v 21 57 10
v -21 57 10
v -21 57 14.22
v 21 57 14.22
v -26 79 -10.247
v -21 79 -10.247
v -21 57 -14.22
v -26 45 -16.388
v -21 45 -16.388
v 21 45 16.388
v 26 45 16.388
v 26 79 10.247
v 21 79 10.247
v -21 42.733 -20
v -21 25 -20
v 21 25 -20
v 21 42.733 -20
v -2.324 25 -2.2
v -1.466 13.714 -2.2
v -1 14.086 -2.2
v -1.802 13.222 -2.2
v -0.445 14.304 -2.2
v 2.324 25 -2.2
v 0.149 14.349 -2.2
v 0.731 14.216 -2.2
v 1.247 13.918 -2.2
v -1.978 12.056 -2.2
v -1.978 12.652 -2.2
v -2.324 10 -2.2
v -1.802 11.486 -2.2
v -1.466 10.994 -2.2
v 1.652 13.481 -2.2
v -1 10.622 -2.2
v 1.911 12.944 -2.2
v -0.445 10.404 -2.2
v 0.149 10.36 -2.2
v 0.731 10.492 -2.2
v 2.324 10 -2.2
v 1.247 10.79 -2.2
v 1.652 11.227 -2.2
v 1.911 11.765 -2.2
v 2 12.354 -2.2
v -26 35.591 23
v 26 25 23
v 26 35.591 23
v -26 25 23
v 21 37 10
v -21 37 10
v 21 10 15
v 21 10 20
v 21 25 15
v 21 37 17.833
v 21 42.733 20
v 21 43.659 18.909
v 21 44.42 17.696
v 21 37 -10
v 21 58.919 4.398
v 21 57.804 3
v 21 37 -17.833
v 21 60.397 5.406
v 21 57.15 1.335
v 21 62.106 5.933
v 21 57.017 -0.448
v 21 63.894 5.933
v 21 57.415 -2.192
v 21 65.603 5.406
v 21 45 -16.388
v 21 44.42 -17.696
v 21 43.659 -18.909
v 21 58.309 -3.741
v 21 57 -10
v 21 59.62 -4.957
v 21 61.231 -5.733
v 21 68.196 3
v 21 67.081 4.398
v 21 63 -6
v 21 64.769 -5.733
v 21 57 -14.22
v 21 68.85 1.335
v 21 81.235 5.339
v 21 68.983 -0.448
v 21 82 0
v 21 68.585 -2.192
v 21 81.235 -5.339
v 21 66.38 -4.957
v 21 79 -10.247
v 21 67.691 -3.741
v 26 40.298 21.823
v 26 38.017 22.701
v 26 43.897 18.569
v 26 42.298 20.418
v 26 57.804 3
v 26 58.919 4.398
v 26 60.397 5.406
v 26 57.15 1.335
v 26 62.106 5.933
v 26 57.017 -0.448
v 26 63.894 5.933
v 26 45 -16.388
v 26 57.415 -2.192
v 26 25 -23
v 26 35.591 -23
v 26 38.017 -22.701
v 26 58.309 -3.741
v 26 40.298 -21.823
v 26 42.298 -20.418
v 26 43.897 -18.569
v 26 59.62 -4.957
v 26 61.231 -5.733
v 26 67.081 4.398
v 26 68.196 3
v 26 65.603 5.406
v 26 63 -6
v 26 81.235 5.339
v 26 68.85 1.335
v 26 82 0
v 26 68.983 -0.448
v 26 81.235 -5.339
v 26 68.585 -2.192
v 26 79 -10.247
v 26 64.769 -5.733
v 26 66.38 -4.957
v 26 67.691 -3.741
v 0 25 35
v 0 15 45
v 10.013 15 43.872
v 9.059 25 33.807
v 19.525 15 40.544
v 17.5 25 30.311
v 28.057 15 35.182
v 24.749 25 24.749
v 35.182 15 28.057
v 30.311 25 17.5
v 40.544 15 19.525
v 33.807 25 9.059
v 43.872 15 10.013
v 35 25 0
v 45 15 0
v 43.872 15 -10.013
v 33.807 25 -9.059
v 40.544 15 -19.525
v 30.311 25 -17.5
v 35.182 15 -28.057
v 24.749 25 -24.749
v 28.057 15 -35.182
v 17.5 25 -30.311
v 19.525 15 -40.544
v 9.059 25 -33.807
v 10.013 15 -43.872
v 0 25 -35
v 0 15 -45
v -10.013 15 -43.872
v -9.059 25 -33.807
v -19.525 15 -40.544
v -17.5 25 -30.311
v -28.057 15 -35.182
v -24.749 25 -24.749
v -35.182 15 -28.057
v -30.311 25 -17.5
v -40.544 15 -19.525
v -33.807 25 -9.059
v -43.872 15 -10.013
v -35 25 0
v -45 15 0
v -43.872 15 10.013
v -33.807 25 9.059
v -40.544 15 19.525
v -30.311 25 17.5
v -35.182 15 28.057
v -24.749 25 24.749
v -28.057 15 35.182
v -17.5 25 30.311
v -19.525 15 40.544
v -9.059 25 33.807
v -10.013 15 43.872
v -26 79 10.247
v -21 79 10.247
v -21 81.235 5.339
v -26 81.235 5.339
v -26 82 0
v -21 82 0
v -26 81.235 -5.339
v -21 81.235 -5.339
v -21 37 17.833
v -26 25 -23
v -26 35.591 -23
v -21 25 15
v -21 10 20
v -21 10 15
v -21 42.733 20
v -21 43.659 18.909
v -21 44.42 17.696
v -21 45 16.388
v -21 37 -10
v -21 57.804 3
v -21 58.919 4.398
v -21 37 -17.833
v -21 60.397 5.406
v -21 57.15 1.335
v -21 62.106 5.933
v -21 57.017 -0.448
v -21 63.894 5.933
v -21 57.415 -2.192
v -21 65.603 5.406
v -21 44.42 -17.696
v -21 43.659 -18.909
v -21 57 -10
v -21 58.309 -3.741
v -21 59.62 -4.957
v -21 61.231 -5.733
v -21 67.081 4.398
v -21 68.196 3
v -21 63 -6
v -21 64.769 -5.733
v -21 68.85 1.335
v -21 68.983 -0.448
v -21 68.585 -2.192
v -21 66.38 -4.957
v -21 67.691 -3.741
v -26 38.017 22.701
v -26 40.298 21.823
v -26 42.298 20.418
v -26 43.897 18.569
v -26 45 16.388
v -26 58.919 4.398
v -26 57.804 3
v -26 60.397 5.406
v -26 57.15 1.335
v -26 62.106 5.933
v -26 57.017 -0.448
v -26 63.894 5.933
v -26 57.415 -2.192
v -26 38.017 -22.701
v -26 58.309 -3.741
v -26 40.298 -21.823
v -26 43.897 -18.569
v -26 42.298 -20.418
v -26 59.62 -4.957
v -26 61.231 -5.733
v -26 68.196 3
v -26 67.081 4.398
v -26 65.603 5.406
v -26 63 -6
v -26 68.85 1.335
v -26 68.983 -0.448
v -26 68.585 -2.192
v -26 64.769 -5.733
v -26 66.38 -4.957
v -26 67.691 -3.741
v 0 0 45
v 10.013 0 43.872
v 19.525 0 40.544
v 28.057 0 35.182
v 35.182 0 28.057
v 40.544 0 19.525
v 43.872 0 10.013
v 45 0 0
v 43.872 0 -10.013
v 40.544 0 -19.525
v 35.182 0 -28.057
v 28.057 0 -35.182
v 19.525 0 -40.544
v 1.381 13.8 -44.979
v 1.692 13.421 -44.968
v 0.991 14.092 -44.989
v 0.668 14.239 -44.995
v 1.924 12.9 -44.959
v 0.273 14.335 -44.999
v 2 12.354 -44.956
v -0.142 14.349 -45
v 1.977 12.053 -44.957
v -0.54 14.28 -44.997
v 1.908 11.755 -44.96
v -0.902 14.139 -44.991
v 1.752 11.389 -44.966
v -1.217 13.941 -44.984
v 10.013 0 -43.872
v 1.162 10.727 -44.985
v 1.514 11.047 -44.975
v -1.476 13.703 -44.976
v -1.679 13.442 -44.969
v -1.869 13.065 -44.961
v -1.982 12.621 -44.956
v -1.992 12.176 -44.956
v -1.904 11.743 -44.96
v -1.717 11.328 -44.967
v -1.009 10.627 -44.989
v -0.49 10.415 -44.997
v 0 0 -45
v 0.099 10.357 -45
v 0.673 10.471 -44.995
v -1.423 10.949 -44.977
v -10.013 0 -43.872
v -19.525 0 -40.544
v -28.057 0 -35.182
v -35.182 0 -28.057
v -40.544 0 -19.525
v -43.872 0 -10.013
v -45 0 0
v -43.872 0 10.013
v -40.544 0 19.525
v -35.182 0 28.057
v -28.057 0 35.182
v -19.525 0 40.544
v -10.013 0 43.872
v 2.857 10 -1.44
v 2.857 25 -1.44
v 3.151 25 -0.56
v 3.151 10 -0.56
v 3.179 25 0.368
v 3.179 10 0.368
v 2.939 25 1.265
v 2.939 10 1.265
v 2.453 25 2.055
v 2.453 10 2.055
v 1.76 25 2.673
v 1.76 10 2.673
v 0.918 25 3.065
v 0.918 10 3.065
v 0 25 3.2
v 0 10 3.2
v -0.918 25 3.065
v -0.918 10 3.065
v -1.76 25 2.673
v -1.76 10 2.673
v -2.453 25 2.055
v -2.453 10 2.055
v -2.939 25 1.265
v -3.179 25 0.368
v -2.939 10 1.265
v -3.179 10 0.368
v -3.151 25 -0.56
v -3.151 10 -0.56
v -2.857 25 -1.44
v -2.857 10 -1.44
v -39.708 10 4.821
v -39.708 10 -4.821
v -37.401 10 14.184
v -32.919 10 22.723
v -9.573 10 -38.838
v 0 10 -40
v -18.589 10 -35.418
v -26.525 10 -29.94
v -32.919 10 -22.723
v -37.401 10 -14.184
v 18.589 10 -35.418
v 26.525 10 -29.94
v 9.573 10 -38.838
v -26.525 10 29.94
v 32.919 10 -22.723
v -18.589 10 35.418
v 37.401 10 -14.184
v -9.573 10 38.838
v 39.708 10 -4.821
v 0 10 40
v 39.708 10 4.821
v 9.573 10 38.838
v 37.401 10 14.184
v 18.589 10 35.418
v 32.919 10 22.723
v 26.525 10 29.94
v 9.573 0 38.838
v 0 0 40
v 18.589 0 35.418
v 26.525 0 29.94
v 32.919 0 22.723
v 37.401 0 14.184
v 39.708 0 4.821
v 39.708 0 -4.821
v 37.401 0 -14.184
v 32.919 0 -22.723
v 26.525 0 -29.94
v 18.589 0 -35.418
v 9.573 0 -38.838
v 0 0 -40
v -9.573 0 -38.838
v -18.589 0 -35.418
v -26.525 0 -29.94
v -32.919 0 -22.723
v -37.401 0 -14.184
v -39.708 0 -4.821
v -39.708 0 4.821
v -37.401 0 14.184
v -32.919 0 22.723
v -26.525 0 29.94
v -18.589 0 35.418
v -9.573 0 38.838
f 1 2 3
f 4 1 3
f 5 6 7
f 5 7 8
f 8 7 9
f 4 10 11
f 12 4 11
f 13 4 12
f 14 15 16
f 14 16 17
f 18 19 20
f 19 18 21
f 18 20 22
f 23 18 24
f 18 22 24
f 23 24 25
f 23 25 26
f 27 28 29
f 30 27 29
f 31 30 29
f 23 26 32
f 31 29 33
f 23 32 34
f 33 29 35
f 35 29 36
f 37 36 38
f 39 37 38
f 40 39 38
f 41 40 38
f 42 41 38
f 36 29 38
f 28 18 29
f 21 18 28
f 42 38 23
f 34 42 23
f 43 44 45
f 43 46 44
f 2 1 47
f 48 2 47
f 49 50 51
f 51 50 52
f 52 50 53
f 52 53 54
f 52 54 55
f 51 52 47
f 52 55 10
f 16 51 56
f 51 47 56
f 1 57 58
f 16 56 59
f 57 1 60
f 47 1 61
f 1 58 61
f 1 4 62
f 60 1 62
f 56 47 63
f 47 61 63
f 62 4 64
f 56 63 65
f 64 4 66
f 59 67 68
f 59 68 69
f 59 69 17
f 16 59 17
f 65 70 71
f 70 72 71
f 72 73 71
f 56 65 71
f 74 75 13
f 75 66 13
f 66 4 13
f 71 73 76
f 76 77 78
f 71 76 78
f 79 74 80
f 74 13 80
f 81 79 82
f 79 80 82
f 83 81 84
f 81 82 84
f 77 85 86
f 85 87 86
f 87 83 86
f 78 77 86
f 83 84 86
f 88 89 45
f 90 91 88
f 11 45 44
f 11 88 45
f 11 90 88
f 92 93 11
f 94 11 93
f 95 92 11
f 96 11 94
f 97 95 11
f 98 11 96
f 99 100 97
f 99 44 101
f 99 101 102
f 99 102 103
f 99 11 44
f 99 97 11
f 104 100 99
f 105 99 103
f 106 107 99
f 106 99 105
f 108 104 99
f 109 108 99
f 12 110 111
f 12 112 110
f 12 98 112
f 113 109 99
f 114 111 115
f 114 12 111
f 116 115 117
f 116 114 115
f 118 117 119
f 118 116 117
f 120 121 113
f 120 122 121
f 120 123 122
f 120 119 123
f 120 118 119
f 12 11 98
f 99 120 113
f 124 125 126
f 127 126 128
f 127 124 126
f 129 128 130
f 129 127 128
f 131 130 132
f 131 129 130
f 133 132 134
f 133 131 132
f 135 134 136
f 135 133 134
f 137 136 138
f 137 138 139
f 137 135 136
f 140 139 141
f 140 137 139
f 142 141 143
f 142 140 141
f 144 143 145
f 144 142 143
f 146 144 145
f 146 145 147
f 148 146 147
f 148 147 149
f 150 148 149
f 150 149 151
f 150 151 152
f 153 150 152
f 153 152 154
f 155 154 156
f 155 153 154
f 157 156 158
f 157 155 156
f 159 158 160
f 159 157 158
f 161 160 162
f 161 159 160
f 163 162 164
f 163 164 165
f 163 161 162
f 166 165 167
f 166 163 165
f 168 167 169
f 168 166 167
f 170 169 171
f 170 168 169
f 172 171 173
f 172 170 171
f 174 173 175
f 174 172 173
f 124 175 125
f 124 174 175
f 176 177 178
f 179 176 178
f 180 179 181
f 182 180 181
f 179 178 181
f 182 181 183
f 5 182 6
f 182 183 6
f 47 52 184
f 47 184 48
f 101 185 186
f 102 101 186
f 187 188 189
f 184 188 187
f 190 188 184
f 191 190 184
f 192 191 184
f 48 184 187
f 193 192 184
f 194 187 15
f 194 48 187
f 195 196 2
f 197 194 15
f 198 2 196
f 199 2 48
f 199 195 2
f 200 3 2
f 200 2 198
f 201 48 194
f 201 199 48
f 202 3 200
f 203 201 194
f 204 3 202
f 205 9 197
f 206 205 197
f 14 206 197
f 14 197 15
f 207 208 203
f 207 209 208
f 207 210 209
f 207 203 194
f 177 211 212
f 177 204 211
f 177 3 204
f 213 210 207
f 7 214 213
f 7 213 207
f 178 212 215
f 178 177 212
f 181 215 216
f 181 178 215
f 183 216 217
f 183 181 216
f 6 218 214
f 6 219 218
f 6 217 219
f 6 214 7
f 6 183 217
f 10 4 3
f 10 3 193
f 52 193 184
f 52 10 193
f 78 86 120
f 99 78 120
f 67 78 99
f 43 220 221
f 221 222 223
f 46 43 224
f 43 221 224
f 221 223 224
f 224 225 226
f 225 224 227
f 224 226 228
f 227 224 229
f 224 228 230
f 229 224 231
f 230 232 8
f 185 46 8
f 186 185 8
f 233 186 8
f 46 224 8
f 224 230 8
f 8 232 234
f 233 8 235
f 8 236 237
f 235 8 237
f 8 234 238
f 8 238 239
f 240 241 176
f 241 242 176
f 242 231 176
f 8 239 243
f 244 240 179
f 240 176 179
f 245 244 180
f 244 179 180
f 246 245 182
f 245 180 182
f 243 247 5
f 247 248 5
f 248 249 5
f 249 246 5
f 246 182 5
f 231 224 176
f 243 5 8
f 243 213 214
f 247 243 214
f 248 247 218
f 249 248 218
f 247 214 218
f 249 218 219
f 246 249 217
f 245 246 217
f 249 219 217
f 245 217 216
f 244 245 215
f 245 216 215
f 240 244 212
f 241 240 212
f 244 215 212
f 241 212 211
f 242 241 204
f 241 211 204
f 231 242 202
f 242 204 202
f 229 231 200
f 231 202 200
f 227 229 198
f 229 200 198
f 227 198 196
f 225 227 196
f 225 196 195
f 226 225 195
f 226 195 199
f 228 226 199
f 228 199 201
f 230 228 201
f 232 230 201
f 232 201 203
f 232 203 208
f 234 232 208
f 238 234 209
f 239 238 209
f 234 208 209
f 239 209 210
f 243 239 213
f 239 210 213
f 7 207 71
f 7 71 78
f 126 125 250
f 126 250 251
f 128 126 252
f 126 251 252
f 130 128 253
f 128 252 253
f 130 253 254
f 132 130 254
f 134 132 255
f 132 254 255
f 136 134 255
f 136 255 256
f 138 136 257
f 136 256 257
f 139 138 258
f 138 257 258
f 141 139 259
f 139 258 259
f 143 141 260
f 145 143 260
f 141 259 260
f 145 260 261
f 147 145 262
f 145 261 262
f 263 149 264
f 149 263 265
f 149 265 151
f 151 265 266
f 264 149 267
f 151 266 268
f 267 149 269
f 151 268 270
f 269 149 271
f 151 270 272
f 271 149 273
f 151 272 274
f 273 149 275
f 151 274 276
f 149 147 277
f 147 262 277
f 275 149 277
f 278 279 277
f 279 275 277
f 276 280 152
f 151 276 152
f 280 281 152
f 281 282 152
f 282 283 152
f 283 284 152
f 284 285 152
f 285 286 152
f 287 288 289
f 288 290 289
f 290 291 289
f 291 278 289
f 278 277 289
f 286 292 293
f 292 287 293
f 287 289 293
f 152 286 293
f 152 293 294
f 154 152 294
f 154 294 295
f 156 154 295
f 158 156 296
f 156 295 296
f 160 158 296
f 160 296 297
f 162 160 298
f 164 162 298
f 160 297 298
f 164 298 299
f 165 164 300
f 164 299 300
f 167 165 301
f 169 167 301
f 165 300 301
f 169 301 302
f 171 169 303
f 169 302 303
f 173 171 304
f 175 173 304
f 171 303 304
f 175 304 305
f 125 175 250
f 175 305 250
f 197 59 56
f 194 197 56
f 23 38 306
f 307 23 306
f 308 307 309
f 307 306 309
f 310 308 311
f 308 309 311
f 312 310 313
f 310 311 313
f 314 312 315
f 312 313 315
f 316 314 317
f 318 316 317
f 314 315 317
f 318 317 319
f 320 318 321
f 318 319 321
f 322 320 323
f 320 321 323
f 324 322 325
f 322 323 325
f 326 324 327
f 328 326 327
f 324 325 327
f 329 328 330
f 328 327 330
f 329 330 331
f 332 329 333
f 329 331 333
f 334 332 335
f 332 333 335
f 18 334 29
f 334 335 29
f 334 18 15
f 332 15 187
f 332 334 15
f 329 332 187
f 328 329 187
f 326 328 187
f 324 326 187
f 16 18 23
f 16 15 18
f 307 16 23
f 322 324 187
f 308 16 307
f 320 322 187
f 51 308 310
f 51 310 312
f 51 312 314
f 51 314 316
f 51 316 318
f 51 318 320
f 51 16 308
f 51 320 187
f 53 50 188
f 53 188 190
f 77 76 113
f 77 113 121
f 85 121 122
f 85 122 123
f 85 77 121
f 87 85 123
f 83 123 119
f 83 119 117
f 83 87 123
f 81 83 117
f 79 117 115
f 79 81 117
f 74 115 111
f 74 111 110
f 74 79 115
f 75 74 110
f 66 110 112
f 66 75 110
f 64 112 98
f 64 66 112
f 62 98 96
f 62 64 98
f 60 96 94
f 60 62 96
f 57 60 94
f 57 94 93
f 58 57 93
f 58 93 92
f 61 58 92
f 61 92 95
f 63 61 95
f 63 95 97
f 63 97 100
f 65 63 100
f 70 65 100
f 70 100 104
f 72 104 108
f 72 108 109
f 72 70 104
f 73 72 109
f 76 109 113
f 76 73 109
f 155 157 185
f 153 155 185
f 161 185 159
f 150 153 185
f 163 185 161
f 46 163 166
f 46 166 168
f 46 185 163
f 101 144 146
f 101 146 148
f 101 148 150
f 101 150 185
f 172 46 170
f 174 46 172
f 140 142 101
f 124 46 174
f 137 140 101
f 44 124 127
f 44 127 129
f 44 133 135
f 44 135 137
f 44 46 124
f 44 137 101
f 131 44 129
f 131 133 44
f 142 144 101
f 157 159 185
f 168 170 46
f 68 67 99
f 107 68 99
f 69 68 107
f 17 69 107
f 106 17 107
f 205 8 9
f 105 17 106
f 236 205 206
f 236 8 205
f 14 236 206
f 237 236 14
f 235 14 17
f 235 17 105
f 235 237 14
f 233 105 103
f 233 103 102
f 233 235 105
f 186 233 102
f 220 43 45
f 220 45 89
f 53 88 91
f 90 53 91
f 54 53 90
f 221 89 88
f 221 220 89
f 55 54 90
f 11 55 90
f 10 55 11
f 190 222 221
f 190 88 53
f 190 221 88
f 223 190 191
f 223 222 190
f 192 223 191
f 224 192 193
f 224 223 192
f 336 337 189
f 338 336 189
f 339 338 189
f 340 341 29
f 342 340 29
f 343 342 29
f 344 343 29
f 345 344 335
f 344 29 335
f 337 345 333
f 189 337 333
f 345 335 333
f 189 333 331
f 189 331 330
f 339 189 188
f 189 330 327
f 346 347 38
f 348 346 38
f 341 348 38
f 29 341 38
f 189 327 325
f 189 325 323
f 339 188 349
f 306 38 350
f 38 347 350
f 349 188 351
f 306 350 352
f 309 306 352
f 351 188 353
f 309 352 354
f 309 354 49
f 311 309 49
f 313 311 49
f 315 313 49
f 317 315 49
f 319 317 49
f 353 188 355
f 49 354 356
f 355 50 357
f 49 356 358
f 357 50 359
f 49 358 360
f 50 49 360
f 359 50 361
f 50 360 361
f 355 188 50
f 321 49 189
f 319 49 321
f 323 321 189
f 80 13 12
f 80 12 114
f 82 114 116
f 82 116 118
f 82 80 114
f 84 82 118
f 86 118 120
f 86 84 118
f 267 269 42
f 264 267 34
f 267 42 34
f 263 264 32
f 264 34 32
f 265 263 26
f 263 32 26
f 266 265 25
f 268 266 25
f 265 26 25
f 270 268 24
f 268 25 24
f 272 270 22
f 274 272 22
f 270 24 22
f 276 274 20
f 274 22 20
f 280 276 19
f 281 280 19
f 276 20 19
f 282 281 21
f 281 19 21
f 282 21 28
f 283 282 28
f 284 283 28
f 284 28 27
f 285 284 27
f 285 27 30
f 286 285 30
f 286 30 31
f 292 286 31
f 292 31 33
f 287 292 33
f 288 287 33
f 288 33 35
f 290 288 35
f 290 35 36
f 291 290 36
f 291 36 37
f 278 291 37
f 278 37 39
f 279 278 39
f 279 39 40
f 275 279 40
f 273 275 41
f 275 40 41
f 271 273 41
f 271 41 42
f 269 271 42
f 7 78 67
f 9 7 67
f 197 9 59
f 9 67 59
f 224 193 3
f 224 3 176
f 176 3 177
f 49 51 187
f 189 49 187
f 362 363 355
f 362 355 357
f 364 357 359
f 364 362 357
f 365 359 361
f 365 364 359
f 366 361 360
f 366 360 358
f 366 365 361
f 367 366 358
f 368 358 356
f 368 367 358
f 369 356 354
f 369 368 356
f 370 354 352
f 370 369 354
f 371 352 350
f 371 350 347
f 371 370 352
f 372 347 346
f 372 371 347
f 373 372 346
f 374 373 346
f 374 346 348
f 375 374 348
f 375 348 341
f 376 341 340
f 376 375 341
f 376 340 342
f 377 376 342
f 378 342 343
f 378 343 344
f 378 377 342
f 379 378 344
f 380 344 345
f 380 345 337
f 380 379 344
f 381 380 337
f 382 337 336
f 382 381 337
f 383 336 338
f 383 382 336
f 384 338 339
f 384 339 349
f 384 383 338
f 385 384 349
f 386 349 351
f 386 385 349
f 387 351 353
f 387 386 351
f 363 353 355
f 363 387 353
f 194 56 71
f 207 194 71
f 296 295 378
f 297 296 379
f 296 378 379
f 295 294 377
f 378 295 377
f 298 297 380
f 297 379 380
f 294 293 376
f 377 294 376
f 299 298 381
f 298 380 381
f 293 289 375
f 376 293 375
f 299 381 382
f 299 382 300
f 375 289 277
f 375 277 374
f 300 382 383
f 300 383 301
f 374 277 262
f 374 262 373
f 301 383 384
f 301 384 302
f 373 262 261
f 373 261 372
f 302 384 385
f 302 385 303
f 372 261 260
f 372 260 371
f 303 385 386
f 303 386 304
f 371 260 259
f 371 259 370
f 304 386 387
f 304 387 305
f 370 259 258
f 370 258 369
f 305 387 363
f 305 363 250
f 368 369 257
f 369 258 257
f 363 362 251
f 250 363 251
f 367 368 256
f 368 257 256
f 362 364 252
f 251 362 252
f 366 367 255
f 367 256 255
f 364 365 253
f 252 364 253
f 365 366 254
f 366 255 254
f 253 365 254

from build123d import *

# Parameters (mm, degrees)
SKETCH1_R               = 45
SKETCH1_R_2             = 40
BOSS_EXTRUDE1_DEPTH     = 10
BOSS_EXTRUDE2_START     = -15
SKETCH2_R               = 45
BOSS_EXTRUDE2_DEPTH     = 15
CHAMFER1_SIZE           = 10
CUT_EXTRUDE1_REACH      = 71.842
CUT_EXTRUDE1_END_RADIUS = 45
SKETCH4_R               = 2
SKETCH9_R               = 6
BOSS_EXTRUDE4_DEPTH     = 5
BOSS_EXTRUDE5_DEPTH     = 42
CUT_EXTRUDE2_REACH      = 87.434
BOSS_EXTRUDE6_DEPTH     = 5
SKETCH14_W              = 3
SKETCH14_H              = 20
BOSS_EXTRUDE7_DEPTH     = 42
FILLET1_START           = -27
FILLET1_DEPTH           = 54
FILLET2_START           = -27
FILLET2_DEPTH           = 54


with BuildPart() as part:
    # Sketch1 → Boss-Extrude1 (new body)
    with BuildSketch(Plane(origin=(0, 0, 0), x_dir=(1, 0, 0), z_dir=(0, 1, 0))):
        with Locations(Location((0, 0, 0), (0, 0, 270))):
            Circle(SKETCH1_R)
        with Locations(Location((0, 0, 0), (0, 0, 270))):
            Circle(SKETCH1_R_2, mode=Mode.SUBTRACT)
    extrude(amount=BOSS_EXTRUDE1_DEPTH)

    # Sketch2 → Boss-Extrude2 (add)
    with BuildSketch(Plane(origin=(0, 25, 0), x_dir=(1, 0, 0), z_dir=(0, 1, 0)).offset(BOSS_EXTRUDE2_START)):
        with Locations(Location((0, 0, 0), (0, 0, 270))):
            Circle(SKETCH2_R)
        with BuildLine():
            Line((-2.323790008, 2.2), (2.323790008, 2.2))
            ThreePointArc((2.323790008, 2.2), (0, -3.2), (-2.323790008, 2.2))
        make_face(mode=Mode.SUBTRACT)
    extrude(amount=BOSS_EXTRUDE2_DEPTH)

    # Chamfer1
    chamfer1_edges = [part.edges().sort_by_distance(p)[0] for p in [
        (0, 25, -45),
    ]]
    chamfer(chamfer1_edges, length=CHAMFER1_SIZE)

    # Cut-Extrude1: up to this cylinder (the profile starts inside it)
    cut_extrude1_end = Plane(origin=(0, 12.354135, 0), z_dir=(0, -1, 0)) * Cylinder(CUT_EXTRUDE1_END_RADIUS, 234.684, mode=Mode.PRIVATE)
    # Sketch4 → Cut-Extrude1 (cut, up to the surface)
    with BuildSketch(Plane.XY.offset(-2.2), mode=Mode.PRIVATE) as cut_extrude1_sk1:
        with Locations((0, 12.354134675)):
            Circle(SKETCH4_R)
    cut_extrude1_tool1 = extrude(cut_extrude1_sk1.sketch, amount=-CUT_EXTRUDE1_REACH, mode=Mode.PRIVATE) & cut_extrude1_end
    add(cut_extrude1_tool1.solids().sort_by_distance((0, 12.354135, -2.2))[0], mode=Mode.SUBTRACT)

    # Sketch9 → Boss-Extrude4 (add)
    with BuildSketch(Plane(origin=(21, 0, 0), x_dir=(0, 0, -1), z_dir=(1, 0, 0))):
        with BuildLine():
            Line((20, 25), (-20, 25))
            Line((-20, 25), (-10.246950766, 79))
            ThreePointArc((-10.246950766, 79), (0, 82), (10.246950766, 79))
            Line((10.246950766, 79), (20, 25))
        make_face()
        with Locations((0, 63)):
            Circle(SKETCH9_R, mode=Mode.SUBTRACT)
    boss_extrude4 = extrude(amount=BOSS_EXTRUDE4_DEPTH)

    # Mirror2: Boss-Extrude4 across plane
    add(boss_extrude4.mirror(Plane(origin=(0, 0, 0), x_dir=(0, 0, 1), z_dir=(1, 0, 0))))

    # Sketch10 → Boss-Extrude5 (add)
    with BuildSketch(Plane.ZY.offset(-21)):
        Polygon((-10, 57), (-14.220415269, 57), (-17.832655726, 37), (-10, 37), (-10, 52), align=None)
        Polygon((10, 52), (10, 57), (14.220415269, 57), (17.832655726, 37), (10, 37), align=None)
    extrude(amount=BOSS_EXTRUDE5_DEPTH)

    # Sketch11 → Cut-Extrude2 (cut, up to next)
    with BuildSketch(Plane(origin=(0, 25, 0), x_dir=(1, 0, 0), z_dir=(0, 1, 0)), mode=Mode.PRIVATE) as cut_extrude2_sk1:
        Polygon((-21, -17.832655726), (-21, -20), (21, -20), (21, -15), (-21, -15), align=None)
    cut_extrude2_tool1 = extrude(cut_extrude2_sk1.sketch, amount=-CUT_EXTRUDE2_REACH, mode=Mode.PRIVATE) & part.part
    add(cut_extrude2_tool1.solids().sort_by_distance((0, 25, 17.5))[0], mode=Mode.SUBTRACT)

    # Sketch13 → Boss-Extrude6 (add)
    with BuildSketch(Plane.ZY.offset(26)):
        Polygon((20, 25), (16.387759543, 45), (20, 45), (23, 45), (23, 25), align=None)
        Polygon((-23, 25), (-20, 25), (-16.387759543, 45), (-20, 45), (-23, 45), align=None)
    boss_extrude6 = extrude(amount=-BOSS_EXTRUDE6_DEPTH)

    # Mirror3: Boss-Extrude6 across plane
    add(boss_extrude6.mirror(Plane(origin=(0, 0, 0), x_dir=(0, 0, 1), z_dir=(1, 0, 0))))

    # Sketch14 → Boss-Extrude7 (add)
    with BuildSketch(Plane(origin=(-21, 0, 0), x_dir=(0, 0, -1), z_dir=(1, 0, 0))):
        with Locations((-21.5, 35)):
            Rectangle(SKETCH14_W, SKETCH14_H)
    boss_extrude7 = extrude(amount=BOSS_EXTRUDE7_DEPTH)

    # Mirror4: Boss-Extrude7 across plane
    add(boss_extrude7.mirror(Plane.XY))

    # Fillet1: read off the stored shape, not the designer's step
    # Fillet1 outline → Fillet1 (cut)
    with BuildSketch(Plane.YZ.offset(FILLET1_START)):
        with BuildLine():
            Line((45, 23), (35.59132925, 23))
            ThreePointArc((35.59132925, 23), (41.341216404, 21.181613393), (45, 16.387759543))
            Line((45, 16.387759543), (45, 23))
        make_face()
    extrude(amount=FILLET1_DEPTH, mode=Mode.SUBTRACT)

    # Fillet2: read off the stored shape, not the designer's step
    # Fillet2 outline → Fillet2 (cut)
    with BuildSketch(Plane.YZ.offset(FILLET2_START)):
        with BuildLine():
            Line((35.59132925, -23), (45, -23))
            Line((45, -23), (45, -16.387759543))
            ThreePointArc((45, -16.387759543), (41.341216404, -21.181613393), (35.59132925, -23))
        make_face()
    extrude(amount=FILLET2_DEPTH, mode=Mode.SUBTRACT)


solid = part.part
